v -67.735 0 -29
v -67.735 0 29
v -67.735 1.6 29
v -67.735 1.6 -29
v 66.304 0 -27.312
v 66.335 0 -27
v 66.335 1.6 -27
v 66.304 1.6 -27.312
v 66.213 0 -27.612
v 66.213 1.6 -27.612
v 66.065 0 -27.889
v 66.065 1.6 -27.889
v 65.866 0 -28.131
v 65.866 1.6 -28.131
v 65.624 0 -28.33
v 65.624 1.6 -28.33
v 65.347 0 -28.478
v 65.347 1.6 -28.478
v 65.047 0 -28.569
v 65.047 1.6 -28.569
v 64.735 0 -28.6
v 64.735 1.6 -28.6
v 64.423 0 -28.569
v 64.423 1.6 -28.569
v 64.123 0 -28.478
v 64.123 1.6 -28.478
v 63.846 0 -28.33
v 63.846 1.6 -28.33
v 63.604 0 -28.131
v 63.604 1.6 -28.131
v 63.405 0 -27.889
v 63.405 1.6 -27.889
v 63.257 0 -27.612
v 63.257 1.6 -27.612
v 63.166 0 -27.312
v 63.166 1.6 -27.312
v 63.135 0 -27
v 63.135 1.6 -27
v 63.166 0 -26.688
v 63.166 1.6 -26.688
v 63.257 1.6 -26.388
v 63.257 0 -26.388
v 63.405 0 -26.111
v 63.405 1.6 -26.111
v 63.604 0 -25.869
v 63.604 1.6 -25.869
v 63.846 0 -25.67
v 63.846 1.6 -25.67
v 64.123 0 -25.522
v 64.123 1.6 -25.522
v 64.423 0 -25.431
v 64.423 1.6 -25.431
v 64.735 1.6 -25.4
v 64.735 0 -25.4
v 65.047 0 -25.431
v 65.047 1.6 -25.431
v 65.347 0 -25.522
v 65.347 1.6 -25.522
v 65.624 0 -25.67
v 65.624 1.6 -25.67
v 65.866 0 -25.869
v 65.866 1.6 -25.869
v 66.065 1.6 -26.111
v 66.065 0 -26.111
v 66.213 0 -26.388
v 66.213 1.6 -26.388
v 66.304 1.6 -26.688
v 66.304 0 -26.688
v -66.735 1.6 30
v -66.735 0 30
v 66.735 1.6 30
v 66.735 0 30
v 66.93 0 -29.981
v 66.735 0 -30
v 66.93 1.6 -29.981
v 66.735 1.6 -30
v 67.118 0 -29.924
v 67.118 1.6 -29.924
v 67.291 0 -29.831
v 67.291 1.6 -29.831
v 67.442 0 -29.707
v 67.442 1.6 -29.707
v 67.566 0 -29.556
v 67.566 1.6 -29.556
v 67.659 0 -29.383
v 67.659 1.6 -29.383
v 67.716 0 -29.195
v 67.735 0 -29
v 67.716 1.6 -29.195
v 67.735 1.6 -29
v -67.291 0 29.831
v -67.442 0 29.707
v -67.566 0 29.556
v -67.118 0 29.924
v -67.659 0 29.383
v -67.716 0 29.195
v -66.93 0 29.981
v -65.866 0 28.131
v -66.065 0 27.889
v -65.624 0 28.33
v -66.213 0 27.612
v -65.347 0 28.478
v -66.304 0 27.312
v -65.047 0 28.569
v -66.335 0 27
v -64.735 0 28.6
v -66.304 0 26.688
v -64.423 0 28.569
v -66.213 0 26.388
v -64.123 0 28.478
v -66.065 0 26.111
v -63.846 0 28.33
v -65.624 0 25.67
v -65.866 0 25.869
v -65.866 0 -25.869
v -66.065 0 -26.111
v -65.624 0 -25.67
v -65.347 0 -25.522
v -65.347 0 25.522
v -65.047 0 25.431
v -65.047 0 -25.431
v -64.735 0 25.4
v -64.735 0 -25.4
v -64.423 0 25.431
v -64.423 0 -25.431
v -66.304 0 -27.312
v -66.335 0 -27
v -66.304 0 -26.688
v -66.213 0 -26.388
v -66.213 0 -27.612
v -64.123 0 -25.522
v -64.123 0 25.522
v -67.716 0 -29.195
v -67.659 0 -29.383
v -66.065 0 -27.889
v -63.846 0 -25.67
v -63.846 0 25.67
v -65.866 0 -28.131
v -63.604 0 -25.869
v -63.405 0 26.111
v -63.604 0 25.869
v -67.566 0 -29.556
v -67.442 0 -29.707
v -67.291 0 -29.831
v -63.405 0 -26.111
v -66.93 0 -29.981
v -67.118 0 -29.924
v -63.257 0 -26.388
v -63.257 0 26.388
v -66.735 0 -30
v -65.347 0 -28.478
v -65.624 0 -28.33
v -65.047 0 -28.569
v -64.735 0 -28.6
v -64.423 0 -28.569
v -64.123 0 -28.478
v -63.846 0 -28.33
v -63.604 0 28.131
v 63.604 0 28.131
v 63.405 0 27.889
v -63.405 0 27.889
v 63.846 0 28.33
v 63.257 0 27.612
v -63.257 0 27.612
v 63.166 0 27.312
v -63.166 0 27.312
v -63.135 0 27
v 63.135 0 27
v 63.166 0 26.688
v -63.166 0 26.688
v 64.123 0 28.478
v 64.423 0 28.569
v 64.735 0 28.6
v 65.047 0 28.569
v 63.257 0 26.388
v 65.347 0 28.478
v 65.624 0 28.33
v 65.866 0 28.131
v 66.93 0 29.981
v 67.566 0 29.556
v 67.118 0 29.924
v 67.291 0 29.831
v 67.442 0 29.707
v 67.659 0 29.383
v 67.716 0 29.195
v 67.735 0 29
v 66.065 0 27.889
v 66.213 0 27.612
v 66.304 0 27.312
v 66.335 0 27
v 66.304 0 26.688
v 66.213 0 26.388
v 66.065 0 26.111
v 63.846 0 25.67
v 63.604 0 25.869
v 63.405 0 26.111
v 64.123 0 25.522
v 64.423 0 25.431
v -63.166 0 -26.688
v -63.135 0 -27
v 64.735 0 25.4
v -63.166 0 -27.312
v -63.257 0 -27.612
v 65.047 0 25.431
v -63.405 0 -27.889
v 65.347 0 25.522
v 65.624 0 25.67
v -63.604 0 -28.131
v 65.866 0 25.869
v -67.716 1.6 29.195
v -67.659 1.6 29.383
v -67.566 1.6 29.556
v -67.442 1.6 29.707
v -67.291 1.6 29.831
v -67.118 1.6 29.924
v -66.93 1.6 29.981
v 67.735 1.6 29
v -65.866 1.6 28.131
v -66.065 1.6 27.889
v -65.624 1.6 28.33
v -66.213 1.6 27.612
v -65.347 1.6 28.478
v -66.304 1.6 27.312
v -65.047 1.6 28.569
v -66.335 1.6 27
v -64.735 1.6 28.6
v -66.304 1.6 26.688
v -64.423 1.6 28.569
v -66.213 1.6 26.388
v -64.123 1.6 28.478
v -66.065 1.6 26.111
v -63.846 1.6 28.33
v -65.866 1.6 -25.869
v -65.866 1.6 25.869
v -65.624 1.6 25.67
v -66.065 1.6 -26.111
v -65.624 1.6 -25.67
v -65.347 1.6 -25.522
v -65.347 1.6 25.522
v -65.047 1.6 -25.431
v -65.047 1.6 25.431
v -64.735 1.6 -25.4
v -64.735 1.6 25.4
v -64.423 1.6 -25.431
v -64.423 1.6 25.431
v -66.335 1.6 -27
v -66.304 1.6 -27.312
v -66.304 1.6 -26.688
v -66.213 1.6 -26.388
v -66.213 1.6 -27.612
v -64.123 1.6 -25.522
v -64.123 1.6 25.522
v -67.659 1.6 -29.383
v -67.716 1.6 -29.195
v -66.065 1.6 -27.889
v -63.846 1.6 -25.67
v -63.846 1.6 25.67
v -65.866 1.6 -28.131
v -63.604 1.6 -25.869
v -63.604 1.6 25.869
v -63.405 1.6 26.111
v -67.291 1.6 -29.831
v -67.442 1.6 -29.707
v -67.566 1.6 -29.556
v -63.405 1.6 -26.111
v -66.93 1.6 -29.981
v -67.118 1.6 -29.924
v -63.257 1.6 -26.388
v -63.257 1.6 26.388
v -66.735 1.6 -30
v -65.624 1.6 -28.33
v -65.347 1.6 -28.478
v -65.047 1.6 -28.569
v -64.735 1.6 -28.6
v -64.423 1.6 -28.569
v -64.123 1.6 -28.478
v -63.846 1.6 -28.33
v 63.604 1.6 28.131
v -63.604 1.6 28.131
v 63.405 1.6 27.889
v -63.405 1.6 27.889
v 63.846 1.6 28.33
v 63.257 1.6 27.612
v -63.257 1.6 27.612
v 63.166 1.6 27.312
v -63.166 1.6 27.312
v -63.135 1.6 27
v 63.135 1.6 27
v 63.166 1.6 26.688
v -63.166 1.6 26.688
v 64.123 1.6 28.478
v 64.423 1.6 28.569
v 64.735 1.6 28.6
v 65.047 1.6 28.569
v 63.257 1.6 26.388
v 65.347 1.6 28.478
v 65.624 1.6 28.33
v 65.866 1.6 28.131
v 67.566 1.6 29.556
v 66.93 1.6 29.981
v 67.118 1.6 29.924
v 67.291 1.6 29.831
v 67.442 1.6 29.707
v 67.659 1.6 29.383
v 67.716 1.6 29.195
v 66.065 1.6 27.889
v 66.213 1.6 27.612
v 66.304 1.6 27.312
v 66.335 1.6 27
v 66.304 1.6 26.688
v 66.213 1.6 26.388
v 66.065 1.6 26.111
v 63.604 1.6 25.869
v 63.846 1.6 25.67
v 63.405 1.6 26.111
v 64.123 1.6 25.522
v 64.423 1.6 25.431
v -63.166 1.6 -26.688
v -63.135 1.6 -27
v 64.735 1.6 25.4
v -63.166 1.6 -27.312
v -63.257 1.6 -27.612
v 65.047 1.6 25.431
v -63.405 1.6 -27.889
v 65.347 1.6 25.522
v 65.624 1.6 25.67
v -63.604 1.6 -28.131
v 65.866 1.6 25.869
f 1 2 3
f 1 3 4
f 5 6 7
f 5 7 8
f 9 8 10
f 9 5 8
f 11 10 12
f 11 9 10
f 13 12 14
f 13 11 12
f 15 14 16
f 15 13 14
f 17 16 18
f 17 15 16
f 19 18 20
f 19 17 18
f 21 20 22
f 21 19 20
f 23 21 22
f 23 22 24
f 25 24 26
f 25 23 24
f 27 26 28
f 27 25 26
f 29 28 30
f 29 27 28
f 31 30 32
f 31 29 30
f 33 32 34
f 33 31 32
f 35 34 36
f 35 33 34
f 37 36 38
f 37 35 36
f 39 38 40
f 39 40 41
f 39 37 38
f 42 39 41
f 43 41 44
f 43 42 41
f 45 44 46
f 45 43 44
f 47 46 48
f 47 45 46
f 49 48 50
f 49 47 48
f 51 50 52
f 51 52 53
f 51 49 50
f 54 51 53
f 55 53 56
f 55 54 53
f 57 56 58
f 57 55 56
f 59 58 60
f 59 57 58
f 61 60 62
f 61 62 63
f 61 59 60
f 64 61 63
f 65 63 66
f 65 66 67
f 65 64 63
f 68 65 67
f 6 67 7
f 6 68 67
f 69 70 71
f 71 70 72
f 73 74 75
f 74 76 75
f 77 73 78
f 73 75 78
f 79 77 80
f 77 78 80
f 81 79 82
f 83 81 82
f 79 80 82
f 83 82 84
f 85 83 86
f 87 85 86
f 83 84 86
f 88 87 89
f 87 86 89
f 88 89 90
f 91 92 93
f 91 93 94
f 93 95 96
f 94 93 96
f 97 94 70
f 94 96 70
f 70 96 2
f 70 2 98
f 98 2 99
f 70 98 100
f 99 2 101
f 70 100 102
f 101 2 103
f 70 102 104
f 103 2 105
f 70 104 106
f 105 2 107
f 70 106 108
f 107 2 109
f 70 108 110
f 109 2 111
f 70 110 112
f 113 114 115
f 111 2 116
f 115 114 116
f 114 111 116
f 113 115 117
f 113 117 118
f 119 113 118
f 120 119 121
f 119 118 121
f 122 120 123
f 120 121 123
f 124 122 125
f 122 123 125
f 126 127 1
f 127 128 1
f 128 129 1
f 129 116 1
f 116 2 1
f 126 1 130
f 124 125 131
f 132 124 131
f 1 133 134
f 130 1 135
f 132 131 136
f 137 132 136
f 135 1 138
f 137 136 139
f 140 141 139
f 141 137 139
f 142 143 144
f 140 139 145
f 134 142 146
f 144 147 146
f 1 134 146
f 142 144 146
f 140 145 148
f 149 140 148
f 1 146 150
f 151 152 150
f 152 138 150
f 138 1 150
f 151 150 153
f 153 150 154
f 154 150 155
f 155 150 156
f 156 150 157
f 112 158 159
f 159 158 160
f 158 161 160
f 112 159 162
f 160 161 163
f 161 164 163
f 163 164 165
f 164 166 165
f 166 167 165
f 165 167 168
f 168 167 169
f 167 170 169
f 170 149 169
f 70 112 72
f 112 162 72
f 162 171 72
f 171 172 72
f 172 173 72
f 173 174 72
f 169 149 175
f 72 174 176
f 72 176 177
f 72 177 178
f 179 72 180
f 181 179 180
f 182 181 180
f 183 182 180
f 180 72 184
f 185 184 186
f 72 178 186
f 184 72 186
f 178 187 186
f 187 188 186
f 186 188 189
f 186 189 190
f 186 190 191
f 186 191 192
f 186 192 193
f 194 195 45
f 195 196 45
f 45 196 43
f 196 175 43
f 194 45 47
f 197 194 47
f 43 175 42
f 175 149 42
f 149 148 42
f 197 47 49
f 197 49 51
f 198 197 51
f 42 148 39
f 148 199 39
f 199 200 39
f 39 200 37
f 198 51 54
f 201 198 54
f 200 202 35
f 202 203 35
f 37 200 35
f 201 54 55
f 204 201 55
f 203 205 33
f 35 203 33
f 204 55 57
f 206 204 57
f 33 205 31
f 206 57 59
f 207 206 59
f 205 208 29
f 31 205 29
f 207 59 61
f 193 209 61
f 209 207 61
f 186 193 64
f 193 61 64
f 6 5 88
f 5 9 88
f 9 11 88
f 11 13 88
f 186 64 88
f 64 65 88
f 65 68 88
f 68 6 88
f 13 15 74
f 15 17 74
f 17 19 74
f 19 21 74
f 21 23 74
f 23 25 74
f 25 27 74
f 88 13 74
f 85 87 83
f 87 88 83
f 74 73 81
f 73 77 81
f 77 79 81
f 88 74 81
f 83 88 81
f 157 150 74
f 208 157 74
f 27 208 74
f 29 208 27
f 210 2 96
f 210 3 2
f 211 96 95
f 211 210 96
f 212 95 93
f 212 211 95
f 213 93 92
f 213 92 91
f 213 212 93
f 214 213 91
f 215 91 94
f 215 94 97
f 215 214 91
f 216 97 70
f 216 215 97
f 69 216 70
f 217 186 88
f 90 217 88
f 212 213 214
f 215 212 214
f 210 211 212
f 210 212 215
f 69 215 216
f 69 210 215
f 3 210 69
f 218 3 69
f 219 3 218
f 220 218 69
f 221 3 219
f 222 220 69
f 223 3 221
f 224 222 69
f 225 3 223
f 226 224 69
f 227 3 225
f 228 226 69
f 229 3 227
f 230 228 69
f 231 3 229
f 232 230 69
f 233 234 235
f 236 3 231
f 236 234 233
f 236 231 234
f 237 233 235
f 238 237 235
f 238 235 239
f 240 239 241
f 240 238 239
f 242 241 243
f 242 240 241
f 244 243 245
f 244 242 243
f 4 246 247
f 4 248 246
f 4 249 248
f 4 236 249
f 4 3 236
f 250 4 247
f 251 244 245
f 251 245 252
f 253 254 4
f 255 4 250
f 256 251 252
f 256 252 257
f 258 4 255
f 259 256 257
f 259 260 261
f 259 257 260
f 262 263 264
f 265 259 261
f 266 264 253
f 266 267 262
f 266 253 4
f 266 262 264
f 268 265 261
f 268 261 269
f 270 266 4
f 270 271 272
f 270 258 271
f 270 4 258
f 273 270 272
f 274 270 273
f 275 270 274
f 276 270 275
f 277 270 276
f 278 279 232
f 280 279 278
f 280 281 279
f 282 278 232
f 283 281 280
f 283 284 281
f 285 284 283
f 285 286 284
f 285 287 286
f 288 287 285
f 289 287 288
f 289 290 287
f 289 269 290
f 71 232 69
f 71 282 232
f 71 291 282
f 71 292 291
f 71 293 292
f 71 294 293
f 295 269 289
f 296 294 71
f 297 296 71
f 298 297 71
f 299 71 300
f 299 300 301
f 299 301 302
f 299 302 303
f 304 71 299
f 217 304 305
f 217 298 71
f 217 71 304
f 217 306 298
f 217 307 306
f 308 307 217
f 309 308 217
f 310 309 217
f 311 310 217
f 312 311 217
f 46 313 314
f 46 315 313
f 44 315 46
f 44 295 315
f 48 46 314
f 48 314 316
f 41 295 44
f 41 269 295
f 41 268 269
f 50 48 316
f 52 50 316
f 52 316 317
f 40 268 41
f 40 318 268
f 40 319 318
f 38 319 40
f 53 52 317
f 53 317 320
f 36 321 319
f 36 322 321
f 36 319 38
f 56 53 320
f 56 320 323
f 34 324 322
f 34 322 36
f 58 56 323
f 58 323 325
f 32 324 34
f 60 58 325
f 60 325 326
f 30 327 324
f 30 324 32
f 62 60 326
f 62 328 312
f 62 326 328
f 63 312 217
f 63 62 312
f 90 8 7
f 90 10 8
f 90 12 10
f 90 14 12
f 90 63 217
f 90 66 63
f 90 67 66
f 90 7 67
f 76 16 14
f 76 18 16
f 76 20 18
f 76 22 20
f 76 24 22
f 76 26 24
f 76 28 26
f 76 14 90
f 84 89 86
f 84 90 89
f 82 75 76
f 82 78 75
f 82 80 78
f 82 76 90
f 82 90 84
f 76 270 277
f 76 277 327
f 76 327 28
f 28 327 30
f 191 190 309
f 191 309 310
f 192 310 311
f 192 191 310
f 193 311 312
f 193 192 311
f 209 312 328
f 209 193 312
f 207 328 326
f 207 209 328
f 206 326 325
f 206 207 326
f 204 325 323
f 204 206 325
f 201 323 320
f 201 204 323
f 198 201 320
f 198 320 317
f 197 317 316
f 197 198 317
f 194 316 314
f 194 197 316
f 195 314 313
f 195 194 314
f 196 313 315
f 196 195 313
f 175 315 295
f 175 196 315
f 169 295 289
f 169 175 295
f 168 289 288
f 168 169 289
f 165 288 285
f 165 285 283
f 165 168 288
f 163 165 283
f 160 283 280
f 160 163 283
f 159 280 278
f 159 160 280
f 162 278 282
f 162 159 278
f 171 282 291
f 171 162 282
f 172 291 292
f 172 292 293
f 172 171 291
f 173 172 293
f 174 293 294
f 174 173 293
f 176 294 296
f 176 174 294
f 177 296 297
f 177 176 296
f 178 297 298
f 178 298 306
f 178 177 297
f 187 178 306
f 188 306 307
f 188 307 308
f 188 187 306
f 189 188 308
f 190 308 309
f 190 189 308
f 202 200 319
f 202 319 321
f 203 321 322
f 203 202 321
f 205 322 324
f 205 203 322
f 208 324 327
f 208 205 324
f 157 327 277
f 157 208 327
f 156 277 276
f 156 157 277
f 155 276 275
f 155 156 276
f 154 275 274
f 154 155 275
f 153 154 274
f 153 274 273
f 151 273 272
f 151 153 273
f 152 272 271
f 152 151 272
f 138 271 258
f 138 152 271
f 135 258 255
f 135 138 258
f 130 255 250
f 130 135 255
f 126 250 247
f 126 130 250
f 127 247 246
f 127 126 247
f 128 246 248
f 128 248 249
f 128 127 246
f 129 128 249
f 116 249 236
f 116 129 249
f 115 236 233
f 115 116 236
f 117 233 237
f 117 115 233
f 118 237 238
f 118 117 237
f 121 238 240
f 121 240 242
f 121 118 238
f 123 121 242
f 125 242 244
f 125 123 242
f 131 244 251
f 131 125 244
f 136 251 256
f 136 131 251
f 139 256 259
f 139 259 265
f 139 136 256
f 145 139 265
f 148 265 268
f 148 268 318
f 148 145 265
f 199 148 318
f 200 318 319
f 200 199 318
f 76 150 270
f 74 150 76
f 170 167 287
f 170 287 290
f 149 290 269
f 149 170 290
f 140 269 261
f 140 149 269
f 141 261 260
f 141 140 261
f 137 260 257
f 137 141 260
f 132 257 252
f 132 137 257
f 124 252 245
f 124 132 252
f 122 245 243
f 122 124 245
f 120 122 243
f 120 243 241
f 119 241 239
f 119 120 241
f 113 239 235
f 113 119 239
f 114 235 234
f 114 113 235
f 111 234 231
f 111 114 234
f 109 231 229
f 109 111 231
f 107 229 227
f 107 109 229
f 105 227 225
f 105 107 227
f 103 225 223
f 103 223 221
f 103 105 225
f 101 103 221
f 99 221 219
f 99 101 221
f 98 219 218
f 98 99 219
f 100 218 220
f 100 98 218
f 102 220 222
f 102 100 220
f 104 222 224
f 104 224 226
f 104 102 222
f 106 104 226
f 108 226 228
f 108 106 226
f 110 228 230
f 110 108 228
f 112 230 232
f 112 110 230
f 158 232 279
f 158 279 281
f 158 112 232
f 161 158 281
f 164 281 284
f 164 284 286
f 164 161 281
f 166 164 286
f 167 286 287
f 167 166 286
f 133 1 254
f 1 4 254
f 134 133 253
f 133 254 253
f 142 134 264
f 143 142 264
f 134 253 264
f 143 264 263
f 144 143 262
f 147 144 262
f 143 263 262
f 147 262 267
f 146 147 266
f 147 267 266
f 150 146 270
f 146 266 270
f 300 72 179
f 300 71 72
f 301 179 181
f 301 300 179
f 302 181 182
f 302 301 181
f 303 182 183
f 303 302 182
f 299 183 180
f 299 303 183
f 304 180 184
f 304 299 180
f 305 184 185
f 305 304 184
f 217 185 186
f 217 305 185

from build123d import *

# Parameters (mm, degrees)
SKETCH_1_W                 = 135.47
SKETCH_1_H                 = 60
EXTRUDE_1_DEPTH            = 1.6
HOLE_WIZARD_M3_1_OUTLINE_R = 1.6
HOLE_WIZARD_M3_1_DEPTH     = 1.6
FILLET_1_R                 = 1


# Read off the part's stored shape, not the designer's step: M3 すきま穴1
with BuildPart() as part:
    # ｽｹｯﾁ1 → ﾎﾞｽ - 押し出し1 (new body)
    with BuildSketch(Plane(origin=(0, 0, 0), x_dir=(1, 0, 0), z_dir=(0, 1, 0))):
        Rectangle(SKETCH_1_W, SKETCH_1_H)
    extrude(amount=EXTRUDE_1_DEPTH)

    # M3 すきま穴1 outline → M3 すきま穴1 (cut)
    with BuildSketch(Plane(origin=(0, 0, 0), x_dir=(1, 0, 0), z_dir=(0, 1, 0))):
        with Locations((64.735, 27)):
            Circle(HOLE_WIZARD_M3_1_OUTLINE_R)
        with Locations((-64.735, -27)):
            Circle(HOLE_WIZARD_M3_1_OUTLINE_R)
        with Locations((64.735, -27)):
            Circle(HOLE_WIZARD_M3_1_OUTLINE_R)
        with Locations((-64.735, 27)):
            Circle(HOLE_WIZARD_M3_1_OUTLINE_R)
    extrude(amount=HOLE_WIZARD_M3_1_DEPTH, mode=Mode.SUBTRACT)

    # ﾌｨﾚｯﾄ1
    fillet_1_edges = [part.edges().sort_by_distance(p)[0] for p in [
        (67.735, 0.8, 30),
        (-67.735, 0.8, 30),
        (-67.735, 0.8, -30),
        (67.735, 0.8, -30),
    ]]
    fillet(fillet_1_edges, radius=FILLET_1_R)


solid = part.part
